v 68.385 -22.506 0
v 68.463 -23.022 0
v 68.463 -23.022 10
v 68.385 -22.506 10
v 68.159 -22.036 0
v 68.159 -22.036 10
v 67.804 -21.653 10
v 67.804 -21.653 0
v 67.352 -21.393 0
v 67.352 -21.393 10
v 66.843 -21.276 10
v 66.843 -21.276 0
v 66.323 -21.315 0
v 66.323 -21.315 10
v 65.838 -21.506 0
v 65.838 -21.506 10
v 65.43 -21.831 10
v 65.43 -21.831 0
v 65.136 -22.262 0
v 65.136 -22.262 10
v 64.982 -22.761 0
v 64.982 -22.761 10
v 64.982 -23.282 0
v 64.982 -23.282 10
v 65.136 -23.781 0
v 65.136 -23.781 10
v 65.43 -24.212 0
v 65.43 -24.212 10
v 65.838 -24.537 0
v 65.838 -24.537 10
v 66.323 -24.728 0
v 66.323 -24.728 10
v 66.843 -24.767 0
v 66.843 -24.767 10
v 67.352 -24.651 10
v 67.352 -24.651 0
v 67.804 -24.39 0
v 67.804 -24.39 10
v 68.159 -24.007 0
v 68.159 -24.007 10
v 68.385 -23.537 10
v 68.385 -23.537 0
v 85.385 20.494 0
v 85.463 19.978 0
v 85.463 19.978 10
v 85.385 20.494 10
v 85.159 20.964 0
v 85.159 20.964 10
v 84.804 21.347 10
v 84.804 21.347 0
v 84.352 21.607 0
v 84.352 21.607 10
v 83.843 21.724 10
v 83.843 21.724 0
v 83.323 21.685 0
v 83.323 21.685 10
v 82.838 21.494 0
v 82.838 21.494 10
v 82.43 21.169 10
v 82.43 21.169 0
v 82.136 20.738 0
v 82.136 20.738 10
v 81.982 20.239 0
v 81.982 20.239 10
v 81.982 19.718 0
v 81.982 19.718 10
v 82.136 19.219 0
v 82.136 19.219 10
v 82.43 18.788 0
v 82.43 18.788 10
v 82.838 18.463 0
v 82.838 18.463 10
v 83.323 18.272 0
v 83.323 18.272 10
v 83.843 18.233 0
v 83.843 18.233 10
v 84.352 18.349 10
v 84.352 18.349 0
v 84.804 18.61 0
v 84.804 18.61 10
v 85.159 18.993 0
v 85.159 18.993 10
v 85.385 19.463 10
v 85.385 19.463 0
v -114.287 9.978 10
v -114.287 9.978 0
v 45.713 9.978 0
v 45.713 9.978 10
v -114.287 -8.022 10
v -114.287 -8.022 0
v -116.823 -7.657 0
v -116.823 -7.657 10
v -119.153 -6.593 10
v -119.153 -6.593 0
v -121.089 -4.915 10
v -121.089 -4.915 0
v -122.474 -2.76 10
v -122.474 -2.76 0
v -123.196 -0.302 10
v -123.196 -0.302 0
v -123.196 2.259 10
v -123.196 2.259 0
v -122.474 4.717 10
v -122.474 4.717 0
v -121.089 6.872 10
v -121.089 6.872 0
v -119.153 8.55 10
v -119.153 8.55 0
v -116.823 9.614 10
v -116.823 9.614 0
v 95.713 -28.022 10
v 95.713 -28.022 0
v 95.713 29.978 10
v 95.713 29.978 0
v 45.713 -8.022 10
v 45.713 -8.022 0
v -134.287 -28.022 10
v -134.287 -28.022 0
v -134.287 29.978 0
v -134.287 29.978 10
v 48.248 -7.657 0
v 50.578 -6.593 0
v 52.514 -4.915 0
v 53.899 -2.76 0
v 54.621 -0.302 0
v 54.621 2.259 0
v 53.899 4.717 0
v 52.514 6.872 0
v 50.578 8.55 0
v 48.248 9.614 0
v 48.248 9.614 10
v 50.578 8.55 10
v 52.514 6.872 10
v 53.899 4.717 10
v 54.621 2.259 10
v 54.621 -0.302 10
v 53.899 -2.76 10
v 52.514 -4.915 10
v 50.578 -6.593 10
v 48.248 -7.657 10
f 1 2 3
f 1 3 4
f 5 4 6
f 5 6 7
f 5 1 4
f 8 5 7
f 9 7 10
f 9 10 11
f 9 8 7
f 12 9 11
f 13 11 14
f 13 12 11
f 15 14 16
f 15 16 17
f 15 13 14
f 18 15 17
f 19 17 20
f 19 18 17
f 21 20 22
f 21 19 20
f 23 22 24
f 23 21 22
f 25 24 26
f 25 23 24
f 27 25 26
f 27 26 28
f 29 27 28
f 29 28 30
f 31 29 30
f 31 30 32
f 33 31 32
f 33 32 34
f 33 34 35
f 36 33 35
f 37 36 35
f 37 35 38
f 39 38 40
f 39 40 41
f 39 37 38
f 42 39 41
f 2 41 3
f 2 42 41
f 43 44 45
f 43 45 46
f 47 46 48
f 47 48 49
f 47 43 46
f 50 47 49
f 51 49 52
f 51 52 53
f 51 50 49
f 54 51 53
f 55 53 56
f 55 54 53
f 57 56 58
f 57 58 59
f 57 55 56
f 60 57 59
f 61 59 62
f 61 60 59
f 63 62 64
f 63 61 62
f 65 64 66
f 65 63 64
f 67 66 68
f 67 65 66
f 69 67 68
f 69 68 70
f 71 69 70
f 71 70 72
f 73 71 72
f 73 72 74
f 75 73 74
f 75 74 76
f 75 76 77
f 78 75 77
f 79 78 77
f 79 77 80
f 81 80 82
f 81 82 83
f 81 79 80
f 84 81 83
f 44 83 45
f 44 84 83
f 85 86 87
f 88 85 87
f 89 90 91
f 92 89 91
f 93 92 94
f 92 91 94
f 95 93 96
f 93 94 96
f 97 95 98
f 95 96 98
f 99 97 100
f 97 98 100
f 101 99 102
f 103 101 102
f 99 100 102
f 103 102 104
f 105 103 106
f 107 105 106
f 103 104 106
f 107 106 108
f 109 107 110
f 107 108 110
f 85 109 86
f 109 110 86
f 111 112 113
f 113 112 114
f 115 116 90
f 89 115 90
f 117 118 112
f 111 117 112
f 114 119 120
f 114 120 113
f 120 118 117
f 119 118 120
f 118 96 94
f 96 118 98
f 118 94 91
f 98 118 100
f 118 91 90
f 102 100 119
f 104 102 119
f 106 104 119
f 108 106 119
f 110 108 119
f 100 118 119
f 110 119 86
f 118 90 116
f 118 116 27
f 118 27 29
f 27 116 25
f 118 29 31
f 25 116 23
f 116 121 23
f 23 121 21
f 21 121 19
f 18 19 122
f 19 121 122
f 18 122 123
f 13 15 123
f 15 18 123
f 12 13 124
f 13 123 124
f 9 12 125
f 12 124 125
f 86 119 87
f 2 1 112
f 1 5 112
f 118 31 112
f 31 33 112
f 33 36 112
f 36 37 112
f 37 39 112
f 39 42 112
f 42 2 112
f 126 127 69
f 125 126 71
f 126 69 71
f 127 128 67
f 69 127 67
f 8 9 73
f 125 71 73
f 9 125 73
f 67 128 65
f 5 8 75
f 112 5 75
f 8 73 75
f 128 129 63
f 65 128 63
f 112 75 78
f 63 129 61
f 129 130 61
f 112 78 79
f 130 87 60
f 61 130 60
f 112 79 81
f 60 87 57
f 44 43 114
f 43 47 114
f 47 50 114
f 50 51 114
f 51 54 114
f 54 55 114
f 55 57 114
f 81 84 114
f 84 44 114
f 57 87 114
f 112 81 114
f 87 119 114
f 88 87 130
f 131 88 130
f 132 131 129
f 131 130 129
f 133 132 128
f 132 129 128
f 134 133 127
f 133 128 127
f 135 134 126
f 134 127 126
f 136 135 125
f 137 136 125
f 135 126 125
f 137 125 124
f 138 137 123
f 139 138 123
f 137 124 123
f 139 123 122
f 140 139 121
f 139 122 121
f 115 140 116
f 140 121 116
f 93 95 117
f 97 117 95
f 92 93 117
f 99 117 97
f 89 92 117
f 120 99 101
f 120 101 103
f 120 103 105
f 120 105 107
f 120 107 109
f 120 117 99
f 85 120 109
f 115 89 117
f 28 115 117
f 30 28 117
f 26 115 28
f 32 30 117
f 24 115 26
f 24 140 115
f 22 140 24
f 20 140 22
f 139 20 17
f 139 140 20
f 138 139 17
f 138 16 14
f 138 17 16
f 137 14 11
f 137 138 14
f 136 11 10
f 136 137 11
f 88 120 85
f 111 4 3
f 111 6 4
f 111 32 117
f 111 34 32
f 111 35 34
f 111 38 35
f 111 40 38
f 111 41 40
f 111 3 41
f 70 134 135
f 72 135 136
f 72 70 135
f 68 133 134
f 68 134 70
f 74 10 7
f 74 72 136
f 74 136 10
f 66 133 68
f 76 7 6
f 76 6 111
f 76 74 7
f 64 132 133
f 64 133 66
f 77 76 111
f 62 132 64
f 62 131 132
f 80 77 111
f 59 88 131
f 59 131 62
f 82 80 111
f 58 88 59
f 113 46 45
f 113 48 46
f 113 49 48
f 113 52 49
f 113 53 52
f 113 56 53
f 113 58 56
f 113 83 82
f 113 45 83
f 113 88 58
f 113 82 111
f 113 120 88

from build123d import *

# Parameters (mm, degrees)
ESQUISSE1_W        = 230
ESQUISSE1_H        = 58
ESQUISSE1_R        = 1.75
BOSS_EXTRU_1_DEPTH = 10


with BuildPart() as part:
    # Esquisse1 → Boss.-Extru.1 (new body)
    with BuildSketch(Plane.XY):
        with Locations((-19.287380446, 0.978440775)):
            Rectangle(ESQUISSE1_W, ESQUISSE1_H)
        with Locations((83.712619554, 19.978440775)):
            Circle(ESQUISSE1_R, mode=Mode.SUBTRACT)
        with Locations((66.712619554, -23.021559225)):
            Circle(ESQUISSE1_R, mode=Mode.SUBTRACT)
        with BuildLine():
            Line((-114.287380446, 9.978440775), (45.712619554, 9.978440775))
            ThreePointArc((45.712619554, 9.978440775), (54.712619554, 0.978440775), (45.712619554, -8.021559225))
            Line((45.712619554, -8.021559225), (-114.287380446, -8.021559225))
            ThreePointArc((-114.287380446, -8.021559225), (-123.287380446, 0.978440775), (-114.287380446, 9.978440775))
        make_face(mode=Mode.SUBTRACT)
    extrude(amount=BOSS_EXTRU_1_DEPTH)


solid = part.part
